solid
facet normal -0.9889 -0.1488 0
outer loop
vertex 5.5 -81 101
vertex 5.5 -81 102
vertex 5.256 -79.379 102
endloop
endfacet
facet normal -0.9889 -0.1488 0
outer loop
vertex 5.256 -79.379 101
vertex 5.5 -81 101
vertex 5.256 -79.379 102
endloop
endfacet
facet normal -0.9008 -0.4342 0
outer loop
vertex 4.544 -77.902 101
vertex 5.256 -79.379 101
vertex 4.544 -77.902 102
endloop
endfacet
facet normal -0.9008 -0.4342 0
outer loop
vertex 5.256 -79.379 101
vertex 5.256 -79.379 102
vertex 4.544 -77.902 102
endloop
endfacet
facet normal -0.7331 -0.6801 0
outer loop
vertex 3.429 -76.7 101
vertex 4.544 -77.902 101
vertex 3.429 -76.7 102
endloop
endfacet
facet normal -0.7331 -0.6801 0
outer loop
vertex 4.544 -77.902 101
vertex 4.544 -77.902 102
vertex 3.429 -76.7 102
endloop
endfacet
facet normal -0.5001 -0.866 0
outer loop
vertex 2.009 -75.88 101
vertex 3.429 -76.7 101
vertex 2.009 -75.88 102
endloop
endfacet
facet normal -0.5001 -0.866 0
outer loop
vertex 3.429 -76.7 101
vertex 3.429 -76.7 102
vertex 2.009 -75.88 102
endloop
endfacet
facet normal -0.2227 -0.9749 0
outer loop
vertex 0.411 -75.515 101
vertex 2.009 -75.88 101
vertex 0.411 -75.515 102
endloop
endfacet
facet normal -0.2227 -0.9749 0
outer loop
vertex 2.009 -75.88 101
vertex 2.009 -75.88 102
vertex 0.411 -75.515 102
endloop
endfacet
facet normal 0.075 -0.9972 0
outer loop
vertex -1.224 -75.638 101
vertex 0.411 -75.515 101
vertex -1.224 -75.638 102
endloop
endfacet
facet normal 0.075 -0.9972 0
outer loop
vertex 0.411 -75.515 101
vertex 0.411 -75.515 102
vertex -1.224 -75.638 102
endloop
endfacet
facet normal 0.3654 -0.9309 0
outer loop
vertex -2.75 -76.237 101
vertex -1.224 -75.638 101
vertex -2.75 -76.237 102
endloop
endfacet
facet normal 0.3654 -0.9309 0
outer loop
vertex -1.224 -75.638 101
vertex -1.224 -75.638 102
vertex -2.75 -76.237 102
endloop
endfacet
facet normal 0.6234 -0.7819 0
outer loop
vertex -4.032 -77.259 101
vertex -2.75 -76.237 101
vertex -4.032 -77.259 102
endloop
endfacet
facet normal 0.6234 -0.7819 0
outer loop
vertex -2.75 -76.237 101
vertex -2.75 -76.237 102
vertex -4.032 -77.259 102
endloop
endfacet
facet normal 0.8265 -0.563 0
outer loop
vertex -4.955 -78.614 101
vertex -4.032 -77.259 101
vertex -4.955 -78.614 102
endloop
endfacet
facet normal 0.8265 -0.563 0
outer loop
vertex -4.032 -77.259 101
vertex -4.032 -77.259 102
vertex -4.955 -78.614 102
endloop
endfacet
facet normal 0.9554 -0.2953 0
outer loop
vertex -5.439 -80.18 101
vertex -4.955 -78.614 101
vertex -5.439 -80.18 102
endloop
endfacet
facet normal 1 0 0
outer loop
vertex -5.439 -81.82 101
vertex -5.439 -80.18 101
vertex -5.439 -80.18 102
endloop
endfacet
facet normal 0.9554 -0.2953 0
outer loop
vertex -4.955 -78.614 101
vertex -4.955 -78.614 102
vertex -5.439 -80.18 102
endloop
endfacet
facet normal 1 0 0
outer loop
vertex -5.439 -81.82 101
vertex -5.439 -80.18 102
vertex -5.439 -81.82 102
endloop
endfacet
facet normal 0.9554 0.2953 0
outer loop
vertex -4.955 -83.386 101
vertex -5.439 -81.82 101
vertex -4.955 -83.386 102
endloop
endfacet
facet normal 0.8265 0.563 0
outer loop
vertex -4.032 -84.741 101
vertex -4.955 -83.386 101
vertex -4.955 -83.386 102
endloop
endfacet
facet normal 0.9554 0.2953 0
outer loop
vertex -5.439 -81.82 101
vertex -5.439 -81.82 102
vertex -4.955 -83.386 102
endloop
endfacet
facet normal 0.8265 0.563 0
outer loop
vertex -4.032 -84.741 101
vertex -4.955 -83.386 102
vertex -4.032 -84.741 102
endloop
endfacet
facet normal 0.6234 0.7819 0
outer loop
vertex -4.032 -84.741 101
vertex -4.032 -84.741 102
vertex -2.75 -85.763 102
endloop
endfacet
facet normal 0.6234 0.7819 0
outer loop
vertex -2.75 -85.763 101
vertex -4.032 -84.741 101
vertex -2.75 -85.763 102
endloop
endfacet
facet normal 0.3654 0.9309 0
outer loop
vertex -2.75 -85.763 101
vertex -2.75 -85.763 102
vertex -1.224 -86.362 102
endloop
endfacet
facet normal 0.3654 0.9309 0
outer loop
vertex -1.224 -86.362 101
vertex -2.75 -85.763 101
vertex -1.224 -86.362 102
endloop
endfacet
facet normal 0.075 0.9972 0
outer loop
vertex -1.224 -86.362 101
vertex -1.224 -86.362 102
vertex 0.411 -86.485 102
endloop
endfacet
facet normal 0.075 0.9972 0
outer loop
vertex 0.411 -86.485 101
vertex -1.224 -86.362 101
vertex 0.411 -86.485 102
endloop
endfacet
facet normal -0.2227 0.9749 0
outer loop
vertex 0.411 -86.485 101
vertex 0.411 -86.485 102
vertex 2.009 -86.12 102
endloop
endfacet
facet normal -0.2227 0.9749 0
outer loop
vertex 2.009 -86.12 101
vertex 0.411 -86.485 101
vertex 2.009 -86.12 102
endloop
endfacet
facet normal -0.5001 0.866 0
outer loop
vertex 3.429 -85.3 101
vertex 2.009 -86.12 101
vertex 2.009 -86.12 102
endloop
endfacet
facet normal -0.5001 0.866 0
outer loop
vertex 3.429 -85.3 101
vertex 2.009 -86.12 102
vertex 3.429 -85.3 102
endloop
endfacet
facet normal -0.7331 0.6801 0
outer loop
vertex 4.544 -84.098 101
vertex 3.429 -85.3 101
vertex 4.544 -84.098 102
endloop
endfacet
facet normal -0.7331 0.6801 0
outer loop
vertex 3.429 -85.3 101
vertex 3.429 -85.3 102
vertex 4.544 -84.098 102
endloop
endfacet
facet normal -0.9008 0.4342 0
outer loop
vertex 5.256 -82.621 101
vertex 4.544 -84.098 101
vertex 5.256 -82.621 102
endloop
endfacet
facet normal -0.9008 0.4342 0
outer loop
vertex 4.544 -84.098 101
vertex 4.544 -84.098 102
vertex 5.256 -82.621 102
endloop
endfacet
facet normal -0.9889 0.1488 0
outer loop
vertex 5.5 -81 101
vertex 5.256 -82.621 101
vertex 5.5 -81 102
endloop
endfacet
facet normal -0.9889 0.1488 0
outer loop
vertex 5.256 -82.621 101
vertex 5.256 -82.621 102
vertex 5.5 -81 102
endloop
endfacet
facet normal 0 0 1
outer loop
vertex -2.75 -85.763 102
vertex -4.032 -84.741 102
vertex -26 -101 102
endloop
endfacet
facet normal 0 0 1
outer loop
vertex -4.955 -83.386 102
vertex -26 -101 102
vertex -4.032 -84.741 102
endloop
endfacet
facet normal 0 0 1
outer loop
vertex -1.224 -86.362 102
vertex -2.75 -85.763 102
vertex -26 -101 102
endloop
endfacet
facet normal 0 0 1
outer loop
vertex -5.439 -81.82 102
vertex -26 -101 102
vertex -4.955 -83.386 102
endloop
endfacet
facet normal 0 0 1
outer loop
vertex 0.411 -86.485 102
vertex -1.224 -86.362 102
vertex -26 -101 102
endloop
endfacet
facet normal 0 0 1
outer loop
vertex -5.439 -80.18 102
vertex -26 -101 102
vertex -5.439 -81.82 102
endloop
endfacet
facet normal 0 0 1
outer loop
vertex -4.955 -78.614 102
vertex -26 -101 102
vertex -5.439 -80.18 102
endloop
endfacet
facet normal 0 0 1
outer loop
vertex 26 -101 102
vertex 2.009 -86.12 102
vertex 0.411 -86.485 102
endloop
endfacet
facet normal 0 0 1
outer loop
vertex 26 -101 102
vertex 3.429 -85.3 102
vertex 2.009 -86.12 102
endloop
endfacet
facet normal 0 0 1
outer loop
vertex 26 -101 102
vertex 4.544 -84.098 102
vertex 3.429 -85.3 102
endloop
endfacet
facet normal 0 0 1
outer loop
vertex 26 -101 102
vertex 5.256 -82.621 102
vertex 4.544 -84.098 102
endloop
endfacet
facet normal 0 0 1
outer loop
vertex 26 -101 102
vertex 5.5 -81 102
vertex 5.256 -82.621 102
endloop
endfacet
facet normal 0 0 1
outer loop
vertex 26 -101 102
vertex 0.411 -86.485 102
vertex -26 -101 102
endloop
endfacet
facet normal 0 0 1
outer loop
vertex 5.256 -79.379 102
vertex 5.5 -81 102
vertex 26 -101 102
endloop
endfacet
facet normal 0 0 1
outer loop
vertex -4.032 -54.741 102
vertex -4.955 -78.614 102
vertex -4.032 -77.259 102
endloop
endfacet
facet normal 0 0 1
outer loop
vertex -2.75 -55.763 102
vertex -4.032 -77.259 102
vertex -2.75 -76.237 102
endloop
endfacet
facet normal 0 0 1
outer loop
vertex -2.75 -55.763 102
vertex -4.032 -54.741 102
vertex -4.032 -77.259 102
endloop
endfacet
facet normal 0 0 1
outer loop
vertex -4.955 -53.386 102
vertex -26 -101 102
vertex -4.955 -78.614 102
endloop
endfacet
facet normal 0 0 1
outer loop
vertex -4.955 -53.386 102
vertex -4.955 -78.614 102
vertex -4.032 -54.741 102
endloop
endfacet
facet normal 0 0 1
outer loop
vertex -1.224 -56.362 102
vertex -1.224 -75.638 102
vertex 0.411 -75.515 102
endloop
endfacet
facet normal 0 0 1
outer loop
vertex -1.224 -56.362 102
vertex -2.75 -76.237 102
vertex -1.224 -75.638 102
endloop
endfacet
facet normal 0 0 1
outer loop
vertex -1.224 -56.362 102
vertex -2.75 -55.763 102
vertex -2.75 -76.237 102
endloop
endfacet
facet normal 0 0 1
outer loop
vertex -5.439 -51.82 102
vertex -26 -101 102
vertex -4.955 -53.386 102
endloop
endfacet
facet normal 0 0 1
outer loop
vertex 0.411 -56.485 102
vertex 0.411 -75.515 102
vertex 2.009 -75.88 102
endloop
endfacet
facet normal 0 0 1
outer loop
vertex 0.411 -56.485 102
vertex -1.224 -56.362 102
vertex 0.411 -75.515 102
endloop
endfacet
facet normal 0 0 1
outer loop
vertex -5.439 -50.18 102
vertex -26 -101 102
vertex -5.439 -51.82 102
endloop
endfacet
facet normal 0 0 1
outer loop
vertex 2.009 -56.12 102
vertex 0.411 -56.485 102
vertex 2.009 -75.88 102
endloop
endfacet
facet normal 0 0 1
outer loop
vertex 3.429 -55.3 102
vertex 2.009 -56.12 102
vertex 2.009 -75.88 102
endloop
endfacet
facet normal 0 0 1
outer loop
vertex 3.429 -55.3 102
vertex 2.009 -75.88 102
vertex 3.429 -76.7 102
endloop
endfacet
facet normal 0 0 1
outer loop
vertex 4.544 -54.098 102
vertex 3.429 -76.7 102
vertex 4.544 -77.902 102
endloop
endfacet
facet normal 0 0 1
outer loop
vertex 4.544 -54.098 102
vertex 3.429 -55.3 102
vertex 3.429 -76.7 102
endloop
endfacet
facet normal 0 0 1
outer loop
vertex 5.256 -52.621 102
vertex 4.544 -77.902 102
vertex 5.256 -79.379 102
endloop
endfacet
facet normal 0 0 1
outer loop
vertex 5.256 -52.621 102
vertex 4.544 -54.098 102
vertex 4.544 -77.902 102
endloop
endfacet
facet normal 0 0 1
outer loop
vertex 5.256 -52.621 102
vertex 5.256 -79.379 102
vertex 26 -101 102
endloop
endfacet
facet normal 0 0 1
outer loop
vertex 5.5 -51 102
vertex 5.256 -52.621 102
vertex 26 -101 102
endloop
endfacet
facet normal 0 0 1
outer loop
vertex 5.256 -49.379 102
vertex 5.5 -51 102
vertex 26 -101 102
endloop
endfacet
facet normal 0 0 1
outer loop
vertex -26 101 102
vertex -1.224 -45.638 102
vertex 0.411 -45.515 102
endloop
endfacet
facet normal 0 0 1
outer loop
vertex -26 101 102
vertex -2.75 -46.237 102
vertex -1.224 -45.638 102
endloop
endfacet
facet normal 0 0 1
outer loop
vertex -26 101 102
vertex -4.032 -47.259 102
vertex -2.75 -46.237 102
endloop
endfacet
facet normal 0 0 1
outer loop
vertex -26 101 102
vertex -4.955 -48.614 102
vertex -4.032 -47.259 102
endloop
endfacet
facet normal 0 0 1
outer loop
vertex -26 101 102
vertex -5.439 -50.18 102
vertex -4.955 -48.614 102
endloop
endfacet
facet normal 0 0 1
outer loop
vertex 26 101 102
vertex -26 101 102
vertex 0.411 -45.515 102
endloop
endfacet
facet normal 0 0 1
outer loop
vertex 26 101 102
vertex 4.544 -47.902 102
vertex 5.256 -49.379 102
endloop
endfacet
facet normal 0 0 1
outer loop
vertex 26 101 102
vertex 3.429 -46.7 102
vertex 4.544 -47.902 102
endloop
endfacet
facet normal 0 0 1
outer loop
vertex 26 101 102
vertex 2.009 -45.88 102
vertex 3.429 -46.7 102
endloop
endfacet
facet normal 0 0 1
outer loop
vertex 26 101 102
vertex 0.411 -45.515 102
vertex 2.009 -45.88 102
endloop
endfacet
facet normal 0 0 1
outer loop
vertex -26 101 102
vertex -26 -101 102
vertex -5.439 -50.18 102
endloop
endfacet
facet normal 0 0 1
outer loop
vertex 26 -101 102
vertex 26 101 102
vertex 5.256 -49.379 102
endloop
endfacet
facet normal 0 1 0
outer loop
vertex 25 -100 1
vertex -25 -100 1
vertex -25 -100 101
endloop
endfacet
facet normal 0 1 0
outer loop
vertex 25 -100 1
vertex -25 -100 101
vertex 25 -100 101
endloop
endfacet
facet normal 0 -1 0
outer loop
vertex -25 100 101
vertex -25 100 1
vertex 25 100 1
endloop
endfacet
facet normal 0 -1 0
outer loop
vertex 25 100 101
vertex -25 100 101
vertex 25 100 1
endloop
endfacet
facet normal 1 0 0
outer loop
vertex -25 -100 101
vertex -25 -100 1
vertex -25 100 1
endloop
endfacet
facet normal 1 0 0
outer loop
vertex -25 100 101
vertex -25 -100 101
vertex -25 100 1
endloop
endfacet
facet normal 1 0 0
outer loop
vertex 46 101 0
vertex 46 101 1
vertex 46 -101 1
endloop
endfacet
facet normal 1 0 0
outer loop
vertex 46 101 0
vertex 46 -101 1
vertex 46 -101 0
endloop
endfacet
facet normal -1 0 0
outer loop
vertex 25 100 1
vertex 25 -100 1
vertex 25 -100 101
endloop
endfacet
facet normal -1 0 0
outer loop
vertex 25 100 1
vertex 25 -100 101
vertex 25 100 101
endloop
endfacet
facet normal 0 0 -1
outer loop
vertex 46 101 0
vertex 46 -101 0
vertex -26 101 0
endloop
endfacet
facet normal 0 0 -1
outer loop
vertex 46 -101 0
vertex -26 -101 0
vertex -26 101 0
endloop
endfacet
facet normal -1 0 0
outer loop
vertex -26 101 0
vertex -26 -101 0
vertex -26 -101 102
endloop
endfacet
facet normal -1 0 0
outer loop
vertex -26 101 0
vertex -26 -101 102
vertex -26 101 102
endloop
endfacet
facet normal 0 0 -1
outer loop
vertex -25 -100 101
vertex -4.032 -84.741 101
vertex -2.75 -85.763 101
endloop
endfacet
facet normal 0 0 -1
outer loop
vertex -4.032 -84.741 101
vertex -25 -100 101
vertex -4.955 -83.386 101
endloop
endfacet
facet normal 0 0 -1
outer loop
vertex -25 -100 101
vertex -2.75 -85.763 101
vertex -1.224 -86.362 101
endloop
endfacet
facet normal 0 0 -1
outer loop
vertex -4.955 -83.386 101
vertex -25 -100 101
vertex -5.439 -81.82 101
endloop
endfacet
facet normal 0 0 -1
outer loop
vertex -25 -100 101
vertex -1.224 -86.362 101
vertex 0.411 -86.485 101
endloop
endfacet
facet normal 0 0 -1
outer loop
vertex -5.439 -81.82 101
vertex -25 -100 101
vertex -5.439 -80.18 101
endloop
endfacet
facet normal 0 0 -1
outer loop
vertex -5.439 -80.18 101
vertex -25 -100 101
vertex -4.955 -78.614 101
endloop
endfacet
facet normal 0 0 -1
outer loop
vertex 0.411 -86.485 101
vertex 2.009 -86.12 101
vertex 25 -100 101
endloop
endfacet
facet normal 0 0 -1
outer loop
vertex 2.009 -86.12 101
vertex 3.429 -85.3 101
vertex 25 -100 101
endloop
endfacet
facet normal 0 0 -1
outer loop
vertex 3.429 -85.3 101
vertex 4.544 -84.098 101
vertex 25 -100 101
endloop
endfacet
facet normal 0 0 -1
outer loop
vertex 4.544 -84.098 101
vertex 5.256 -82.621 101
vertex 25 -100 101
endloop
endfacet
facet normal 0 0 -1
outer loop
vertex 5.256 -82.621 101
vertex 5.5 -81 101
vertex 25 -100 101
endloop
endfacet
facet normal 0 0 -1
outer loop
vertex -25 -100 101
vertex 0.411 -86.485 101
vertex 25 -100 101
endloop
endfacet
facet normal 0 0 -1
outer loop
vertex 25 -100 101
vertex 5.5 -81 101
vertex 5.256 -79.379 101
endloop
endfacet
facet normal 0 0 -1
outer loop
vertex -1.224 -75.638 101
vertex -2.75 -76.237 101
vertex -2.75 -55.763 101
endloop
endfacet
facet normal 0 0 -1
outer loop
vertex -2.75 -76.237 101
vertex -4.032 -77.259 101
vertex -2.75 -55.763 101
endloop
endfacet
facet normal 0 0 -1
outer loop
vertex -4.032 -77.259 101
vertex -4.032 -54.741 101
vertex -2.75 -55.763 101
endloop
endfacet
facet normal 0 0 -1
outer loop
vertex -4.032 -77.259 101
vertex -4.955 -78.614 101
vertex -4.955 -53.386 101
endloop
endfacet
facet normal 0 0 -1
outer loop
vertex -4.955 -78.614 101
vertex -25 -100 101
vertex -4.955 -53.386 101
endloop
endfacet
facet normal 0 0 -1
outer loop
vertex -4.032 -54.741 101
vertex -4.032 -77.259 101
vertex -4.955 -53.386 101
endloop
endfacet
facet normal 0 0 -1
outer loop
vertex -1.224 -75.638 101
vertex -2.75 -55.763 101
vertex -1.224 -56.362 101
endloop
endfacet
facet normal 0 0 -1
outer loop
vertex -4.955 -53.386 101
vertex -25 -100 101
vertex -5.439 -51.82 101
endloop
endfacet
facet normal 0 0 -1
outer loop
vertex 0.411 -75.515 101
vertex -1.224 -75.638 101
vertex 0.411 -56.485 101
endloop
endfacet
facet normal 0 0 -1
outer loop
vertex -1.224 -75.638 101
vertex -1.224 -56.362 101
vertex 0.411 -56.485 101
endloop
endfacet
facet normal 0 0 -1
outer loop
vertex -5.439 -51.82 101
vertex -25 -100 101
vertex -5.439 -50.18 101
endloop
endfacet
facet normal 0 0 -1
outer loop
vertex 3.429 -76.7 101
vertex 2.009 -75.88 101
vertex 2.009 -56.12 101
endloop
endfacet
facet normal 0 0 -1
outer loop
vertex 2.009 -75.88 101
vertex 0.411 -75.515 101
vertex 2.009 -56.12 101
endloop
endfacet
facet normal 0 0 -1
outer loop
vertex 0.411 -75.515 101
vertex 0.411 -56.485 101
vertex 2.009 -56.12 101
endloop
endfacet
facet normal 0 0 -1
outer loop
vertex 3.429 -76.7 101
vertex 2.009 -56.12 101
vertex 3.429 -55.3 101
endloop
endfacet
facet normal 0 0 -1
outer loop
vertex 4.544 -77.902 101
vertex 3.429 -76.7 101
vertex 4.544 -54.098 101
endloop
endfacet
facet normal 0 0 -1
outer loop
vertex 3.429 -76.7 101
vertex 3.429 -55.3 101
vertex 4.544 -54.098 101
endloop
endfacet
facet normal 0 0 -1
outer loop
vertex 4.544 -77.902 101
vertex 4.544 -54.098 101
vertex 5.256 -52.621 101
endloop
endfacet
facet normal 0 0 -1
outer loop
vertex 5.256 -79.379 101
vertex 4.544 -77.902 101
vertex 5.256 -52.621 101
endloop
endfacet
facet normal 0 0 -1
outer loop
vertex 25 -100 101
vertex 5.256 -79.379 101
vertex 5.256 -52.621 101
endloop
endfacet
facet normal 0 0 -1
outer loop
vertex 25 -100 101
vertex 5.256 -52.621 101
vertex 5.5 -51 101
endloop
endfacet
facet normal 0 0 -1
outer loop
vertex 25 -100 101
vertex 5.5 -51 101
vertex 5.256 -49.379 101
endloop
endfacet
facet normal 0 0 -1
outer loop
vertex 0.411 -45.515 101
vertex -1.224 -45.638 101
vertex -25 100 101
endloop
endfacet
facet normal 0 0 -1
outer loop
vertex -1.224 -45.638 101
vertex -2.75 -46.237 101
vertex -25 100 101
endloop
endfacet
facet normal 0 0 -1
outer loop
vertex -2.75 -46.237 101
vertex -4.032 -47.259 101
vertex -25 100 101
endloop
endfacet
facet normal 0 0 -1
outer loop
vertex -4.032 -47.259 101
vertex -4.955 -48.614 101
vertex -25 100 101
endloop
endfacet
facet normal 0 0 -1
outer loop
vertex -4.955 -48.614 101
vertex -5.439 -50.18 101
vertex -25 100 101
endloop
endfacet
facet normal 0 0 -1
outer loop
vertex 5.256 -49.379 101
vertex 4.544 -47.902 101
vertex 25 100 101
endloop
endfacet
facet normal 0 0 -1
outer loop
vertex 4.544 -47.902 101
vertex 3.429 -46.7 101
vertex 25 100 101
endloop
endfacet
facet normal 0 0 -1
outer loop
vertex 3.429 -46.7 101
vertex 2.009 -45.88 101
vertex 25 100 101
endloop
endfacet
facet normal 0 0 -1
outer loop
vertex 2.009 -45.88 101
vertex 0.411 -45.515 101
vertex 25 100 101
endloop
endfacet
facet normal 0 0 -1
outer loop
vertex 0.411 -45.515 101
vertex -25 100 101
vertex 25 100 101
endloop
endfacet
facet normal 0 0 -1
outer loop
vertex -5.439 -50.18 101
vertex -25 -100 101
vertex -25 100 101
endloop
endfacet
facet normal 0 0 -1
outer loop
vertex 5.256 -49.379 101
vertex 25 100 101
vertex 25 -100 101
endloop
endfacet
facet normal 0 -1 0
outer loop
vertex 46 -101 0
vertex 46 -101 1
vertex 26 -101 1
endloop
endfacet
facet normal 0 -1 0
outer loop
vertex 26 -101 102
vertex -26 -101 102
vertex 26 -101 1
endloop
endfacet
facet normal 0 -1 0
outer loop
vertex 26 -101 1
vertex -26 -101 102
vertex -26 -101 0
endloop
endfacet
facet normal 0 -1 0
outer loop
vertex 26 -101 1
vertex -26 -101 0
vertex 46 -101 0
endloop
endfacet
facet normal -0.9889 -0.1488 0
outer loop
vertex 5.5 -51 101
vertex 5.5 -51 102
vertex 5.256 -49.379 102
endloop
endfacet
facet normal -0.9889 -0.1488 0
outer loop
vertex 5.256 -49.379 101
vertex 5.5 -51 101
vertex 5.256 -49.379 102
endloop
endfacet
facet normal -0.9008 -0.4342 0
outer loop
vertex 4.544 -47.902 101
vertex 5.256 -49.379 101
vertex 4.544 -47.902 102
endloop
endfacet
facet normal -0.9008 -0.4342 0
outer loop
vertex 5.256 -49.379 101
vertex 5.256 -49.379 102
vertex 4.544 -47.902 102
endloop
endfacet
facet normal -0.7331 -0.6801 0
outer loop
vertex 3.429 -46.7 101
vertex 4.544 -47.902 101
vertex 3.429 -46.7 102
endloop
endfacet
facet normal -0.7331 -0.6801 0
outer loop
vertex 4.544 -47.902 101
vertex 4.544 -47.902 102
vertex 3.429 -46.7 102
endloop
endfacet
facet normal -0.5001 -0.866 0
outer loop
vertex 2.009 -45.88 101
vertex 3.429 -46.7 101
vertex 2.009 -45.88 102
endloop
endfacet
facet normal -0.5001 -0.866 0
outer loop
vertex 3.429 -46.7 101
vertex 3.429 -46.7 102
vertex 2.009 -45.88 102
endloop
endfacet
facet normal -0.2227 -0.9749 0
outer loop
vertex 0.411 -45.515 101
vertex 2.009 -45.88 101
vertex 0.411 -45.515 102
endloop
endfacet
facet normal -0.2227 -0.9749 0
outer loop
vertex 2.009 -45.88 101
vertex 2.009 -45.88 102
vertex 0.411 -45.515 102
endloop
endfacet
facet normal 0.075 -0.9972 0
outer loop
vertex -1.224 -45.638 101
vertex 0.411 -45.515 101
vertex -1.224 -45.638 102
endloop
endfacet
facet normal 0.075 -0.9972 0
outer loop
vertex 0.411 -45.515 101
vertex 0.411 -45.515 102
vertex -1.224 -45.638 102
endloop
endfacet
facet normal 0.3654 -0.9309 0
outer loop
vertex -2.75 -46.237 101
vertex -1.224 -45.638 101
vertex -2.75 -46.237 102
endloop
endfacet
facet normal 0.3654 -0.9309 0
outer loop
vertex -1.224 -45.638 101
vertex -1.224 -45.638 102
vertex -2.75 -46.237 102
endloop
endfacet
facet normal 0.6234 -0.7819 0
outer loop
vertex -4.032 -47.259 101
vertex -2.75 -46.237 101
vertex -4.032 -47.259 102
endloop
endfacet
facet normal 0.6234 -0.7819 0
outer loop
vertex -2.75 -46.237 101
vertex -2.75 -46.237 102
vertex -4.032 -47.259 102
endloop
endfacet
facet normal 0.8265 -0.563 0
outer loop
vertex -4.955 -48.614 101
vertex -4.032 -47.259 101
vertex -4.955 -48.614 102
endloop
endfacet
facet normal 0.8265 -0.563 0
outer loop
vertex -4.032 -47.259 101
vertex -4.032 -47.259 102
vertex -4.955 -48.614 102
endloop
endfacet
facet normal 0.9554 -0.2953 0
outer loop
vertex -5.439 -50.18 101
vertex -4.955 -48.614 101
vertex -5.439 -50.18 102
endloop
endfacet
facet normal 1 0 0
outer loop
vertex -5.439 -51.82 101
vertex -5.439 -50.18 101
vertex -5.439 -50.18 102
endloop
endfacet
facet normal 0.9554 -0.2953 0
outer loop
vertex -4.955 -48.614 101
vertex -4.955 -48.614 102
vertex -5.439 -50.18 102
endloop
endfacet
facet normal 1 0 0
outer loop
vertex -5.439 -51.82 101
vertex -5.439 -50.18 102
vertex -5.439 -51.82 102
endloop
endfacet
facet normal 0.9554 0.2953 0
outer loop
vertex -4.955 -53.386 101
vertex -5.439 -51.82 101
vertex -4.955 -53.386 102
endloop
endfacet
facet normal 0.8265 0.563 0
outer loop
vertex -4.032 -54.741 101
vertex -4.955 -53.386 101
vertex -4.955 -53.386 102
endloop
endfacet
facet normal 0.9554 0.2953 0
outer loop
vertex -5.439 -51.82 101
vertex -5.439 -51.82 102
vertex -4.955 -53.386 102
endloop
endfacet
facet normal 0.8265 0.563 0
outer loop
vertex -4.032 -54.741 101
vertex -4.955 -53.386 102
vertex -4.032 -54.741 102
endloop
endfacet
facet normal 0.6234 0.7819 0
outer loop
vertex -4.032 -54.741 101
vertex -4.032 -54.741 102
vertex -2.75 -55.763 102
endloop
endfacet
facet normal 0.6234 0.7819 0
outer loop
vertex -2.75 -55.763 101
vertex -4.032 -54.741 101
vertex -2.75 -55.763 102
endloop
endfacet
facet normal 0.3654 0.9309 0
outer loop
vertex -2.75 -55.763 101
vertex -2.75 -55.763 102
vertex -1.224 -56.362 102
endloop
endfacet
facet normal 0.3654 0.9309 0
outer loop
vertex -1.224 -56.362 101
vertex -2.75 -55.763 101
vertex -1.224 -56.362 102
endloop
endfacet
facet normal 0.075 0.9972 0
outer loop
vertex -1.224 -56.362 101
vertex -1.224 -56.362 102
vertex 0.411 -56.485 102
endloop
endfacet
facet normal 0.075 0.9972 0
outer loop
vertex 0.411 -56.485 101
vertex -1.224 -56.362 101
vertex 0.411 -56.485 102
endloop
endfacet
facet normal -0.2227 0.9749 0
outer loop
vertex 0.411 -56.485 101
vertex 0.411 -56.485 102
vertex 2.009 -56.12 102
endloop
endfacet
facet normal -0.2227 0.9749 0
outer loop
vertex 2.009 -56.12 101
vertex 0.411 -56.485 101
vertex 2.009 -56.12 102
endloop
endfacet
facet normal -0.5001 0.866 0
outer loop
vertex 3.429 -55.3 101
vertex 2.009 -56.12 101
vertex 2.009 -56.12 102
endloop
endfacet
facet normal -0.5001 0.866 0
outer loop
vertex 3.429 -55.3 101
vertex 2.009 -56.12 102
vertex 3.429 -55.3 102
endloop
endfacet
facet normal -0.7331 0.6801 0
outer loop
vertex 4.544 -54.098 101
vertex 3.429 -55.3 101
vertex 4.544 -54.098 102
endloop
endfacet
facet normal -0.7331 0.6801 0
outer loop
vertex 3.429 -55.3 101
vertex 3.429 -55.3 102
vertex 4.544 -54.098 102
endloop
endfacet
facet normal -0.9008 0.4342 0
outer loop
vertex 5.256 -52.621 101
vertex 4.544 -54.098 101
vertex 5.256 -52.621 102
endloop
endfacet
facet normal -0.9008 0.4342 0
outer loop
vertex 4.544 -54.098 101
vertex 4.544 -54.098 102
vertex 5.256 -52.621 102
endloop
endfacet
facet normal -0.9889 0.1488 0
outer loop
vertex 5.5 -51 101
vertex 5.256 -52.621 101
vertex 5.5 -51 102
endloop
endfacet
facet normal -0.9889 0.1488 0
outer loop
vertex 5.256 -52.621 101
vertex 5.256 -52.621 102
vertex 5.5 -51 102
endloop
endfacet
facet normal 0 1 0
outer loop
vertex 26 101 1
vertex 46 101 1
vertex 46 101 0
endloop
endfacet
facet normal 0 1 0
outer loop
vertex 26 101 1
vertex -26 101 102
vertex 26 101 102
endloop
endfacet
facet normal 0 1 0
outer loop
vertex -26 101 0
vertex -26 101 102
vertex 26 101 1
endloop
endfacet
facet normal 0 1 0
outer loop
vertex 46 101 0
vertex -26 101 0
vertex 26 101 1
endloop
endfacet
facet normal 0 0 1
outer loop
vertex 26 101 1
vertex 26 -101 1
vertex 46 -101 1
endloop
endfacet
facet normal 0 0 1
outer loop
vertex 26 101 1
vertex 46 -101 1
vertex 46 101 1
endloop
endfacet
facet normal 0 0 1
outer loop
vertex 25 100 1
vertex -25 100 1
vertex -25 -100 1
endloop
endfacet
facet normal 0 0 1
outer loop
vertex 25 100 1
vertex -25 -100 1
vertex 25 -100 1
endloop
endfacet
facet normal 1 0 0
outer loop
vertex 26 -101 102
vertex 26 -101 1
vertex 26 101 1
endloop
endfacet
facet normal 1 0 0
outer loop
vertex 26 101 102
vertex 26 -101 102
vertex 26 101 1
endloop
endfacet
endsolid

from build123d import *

# Parameters (mm, degrees)
ESQUISSE1_W             = 52
ESQUISSE1_H             = 202
BOSS_EXTRU_1_DEPTH      = 102
COQUE1_T                = -1
ESQUISSE2_W             = 50
ESQUISSE2_H             = 200
BOSS_EXTRU_2_DEPTH      = 1
ESQUISSE3_R             = 5.5
ENL_V_MAT_EXTRU_1_DEPTH = 1
ESQUISSE4_W             = 1
ESQUISSE4_H             = 202
BOSS_EXTRU_3_DEPTH      = 20


with BuildPart() as part:
    # Esquisse1 → Boss.-Extru.1 (new body)
    with BuildSketch(Plane.XY):
        Rectangle(ESQUISSE1_W, ESQUISSE1_H)
    extrude(amount=BOSS_EXTRU_1_DEPTH)

    # Coque1
    coque1_openings = [part.faces().sort_by_distance(p)[0] for p in [
        (0, 0, 102),
    ]]
    offset(amount=COQUE1_T, openings=coque1_openings, kind=Kind.INTERSECTION)

    # Esquisse2 → Boss.-Extru.2 (add)
    with BuildSketch(Plane.XY.offset(102)):
        Rectangle(ESQUISSE2_W, ESQUISSE2_H)
    extrude(amount=-BOSS_EXTRU_2_DEPTH)

    # Esquisse3 → Enlèv. mat.-Extru.1 (cut)
    with BuildSketch(Plane.XY.offset(102)):
        with Locations((0, -81)):
            Circle(ESQUISSE3_R)
        with Locations((0, -51)):
            Circle(ESQUISSE3_R)
    extrude(amount=-ENL_V_MAT_EXTRU_1_DEPTH, mode=Mode.SUBTRACT)

    # Esquisse4 → Boss.-Extru.3 (add)
    with BuildSketch(Plane(origin=(26, 0, 0), x_dir=(0, 0, -1), z_dir=(1, 0, 0))):
        with Locations((-0.5, 0)):
            Rectangle(ESQUISSE4_W, ESQUISSE4_H)
    extrude(amount=BOSS_EXTRU_3_DEPTH)


solid = part.part
